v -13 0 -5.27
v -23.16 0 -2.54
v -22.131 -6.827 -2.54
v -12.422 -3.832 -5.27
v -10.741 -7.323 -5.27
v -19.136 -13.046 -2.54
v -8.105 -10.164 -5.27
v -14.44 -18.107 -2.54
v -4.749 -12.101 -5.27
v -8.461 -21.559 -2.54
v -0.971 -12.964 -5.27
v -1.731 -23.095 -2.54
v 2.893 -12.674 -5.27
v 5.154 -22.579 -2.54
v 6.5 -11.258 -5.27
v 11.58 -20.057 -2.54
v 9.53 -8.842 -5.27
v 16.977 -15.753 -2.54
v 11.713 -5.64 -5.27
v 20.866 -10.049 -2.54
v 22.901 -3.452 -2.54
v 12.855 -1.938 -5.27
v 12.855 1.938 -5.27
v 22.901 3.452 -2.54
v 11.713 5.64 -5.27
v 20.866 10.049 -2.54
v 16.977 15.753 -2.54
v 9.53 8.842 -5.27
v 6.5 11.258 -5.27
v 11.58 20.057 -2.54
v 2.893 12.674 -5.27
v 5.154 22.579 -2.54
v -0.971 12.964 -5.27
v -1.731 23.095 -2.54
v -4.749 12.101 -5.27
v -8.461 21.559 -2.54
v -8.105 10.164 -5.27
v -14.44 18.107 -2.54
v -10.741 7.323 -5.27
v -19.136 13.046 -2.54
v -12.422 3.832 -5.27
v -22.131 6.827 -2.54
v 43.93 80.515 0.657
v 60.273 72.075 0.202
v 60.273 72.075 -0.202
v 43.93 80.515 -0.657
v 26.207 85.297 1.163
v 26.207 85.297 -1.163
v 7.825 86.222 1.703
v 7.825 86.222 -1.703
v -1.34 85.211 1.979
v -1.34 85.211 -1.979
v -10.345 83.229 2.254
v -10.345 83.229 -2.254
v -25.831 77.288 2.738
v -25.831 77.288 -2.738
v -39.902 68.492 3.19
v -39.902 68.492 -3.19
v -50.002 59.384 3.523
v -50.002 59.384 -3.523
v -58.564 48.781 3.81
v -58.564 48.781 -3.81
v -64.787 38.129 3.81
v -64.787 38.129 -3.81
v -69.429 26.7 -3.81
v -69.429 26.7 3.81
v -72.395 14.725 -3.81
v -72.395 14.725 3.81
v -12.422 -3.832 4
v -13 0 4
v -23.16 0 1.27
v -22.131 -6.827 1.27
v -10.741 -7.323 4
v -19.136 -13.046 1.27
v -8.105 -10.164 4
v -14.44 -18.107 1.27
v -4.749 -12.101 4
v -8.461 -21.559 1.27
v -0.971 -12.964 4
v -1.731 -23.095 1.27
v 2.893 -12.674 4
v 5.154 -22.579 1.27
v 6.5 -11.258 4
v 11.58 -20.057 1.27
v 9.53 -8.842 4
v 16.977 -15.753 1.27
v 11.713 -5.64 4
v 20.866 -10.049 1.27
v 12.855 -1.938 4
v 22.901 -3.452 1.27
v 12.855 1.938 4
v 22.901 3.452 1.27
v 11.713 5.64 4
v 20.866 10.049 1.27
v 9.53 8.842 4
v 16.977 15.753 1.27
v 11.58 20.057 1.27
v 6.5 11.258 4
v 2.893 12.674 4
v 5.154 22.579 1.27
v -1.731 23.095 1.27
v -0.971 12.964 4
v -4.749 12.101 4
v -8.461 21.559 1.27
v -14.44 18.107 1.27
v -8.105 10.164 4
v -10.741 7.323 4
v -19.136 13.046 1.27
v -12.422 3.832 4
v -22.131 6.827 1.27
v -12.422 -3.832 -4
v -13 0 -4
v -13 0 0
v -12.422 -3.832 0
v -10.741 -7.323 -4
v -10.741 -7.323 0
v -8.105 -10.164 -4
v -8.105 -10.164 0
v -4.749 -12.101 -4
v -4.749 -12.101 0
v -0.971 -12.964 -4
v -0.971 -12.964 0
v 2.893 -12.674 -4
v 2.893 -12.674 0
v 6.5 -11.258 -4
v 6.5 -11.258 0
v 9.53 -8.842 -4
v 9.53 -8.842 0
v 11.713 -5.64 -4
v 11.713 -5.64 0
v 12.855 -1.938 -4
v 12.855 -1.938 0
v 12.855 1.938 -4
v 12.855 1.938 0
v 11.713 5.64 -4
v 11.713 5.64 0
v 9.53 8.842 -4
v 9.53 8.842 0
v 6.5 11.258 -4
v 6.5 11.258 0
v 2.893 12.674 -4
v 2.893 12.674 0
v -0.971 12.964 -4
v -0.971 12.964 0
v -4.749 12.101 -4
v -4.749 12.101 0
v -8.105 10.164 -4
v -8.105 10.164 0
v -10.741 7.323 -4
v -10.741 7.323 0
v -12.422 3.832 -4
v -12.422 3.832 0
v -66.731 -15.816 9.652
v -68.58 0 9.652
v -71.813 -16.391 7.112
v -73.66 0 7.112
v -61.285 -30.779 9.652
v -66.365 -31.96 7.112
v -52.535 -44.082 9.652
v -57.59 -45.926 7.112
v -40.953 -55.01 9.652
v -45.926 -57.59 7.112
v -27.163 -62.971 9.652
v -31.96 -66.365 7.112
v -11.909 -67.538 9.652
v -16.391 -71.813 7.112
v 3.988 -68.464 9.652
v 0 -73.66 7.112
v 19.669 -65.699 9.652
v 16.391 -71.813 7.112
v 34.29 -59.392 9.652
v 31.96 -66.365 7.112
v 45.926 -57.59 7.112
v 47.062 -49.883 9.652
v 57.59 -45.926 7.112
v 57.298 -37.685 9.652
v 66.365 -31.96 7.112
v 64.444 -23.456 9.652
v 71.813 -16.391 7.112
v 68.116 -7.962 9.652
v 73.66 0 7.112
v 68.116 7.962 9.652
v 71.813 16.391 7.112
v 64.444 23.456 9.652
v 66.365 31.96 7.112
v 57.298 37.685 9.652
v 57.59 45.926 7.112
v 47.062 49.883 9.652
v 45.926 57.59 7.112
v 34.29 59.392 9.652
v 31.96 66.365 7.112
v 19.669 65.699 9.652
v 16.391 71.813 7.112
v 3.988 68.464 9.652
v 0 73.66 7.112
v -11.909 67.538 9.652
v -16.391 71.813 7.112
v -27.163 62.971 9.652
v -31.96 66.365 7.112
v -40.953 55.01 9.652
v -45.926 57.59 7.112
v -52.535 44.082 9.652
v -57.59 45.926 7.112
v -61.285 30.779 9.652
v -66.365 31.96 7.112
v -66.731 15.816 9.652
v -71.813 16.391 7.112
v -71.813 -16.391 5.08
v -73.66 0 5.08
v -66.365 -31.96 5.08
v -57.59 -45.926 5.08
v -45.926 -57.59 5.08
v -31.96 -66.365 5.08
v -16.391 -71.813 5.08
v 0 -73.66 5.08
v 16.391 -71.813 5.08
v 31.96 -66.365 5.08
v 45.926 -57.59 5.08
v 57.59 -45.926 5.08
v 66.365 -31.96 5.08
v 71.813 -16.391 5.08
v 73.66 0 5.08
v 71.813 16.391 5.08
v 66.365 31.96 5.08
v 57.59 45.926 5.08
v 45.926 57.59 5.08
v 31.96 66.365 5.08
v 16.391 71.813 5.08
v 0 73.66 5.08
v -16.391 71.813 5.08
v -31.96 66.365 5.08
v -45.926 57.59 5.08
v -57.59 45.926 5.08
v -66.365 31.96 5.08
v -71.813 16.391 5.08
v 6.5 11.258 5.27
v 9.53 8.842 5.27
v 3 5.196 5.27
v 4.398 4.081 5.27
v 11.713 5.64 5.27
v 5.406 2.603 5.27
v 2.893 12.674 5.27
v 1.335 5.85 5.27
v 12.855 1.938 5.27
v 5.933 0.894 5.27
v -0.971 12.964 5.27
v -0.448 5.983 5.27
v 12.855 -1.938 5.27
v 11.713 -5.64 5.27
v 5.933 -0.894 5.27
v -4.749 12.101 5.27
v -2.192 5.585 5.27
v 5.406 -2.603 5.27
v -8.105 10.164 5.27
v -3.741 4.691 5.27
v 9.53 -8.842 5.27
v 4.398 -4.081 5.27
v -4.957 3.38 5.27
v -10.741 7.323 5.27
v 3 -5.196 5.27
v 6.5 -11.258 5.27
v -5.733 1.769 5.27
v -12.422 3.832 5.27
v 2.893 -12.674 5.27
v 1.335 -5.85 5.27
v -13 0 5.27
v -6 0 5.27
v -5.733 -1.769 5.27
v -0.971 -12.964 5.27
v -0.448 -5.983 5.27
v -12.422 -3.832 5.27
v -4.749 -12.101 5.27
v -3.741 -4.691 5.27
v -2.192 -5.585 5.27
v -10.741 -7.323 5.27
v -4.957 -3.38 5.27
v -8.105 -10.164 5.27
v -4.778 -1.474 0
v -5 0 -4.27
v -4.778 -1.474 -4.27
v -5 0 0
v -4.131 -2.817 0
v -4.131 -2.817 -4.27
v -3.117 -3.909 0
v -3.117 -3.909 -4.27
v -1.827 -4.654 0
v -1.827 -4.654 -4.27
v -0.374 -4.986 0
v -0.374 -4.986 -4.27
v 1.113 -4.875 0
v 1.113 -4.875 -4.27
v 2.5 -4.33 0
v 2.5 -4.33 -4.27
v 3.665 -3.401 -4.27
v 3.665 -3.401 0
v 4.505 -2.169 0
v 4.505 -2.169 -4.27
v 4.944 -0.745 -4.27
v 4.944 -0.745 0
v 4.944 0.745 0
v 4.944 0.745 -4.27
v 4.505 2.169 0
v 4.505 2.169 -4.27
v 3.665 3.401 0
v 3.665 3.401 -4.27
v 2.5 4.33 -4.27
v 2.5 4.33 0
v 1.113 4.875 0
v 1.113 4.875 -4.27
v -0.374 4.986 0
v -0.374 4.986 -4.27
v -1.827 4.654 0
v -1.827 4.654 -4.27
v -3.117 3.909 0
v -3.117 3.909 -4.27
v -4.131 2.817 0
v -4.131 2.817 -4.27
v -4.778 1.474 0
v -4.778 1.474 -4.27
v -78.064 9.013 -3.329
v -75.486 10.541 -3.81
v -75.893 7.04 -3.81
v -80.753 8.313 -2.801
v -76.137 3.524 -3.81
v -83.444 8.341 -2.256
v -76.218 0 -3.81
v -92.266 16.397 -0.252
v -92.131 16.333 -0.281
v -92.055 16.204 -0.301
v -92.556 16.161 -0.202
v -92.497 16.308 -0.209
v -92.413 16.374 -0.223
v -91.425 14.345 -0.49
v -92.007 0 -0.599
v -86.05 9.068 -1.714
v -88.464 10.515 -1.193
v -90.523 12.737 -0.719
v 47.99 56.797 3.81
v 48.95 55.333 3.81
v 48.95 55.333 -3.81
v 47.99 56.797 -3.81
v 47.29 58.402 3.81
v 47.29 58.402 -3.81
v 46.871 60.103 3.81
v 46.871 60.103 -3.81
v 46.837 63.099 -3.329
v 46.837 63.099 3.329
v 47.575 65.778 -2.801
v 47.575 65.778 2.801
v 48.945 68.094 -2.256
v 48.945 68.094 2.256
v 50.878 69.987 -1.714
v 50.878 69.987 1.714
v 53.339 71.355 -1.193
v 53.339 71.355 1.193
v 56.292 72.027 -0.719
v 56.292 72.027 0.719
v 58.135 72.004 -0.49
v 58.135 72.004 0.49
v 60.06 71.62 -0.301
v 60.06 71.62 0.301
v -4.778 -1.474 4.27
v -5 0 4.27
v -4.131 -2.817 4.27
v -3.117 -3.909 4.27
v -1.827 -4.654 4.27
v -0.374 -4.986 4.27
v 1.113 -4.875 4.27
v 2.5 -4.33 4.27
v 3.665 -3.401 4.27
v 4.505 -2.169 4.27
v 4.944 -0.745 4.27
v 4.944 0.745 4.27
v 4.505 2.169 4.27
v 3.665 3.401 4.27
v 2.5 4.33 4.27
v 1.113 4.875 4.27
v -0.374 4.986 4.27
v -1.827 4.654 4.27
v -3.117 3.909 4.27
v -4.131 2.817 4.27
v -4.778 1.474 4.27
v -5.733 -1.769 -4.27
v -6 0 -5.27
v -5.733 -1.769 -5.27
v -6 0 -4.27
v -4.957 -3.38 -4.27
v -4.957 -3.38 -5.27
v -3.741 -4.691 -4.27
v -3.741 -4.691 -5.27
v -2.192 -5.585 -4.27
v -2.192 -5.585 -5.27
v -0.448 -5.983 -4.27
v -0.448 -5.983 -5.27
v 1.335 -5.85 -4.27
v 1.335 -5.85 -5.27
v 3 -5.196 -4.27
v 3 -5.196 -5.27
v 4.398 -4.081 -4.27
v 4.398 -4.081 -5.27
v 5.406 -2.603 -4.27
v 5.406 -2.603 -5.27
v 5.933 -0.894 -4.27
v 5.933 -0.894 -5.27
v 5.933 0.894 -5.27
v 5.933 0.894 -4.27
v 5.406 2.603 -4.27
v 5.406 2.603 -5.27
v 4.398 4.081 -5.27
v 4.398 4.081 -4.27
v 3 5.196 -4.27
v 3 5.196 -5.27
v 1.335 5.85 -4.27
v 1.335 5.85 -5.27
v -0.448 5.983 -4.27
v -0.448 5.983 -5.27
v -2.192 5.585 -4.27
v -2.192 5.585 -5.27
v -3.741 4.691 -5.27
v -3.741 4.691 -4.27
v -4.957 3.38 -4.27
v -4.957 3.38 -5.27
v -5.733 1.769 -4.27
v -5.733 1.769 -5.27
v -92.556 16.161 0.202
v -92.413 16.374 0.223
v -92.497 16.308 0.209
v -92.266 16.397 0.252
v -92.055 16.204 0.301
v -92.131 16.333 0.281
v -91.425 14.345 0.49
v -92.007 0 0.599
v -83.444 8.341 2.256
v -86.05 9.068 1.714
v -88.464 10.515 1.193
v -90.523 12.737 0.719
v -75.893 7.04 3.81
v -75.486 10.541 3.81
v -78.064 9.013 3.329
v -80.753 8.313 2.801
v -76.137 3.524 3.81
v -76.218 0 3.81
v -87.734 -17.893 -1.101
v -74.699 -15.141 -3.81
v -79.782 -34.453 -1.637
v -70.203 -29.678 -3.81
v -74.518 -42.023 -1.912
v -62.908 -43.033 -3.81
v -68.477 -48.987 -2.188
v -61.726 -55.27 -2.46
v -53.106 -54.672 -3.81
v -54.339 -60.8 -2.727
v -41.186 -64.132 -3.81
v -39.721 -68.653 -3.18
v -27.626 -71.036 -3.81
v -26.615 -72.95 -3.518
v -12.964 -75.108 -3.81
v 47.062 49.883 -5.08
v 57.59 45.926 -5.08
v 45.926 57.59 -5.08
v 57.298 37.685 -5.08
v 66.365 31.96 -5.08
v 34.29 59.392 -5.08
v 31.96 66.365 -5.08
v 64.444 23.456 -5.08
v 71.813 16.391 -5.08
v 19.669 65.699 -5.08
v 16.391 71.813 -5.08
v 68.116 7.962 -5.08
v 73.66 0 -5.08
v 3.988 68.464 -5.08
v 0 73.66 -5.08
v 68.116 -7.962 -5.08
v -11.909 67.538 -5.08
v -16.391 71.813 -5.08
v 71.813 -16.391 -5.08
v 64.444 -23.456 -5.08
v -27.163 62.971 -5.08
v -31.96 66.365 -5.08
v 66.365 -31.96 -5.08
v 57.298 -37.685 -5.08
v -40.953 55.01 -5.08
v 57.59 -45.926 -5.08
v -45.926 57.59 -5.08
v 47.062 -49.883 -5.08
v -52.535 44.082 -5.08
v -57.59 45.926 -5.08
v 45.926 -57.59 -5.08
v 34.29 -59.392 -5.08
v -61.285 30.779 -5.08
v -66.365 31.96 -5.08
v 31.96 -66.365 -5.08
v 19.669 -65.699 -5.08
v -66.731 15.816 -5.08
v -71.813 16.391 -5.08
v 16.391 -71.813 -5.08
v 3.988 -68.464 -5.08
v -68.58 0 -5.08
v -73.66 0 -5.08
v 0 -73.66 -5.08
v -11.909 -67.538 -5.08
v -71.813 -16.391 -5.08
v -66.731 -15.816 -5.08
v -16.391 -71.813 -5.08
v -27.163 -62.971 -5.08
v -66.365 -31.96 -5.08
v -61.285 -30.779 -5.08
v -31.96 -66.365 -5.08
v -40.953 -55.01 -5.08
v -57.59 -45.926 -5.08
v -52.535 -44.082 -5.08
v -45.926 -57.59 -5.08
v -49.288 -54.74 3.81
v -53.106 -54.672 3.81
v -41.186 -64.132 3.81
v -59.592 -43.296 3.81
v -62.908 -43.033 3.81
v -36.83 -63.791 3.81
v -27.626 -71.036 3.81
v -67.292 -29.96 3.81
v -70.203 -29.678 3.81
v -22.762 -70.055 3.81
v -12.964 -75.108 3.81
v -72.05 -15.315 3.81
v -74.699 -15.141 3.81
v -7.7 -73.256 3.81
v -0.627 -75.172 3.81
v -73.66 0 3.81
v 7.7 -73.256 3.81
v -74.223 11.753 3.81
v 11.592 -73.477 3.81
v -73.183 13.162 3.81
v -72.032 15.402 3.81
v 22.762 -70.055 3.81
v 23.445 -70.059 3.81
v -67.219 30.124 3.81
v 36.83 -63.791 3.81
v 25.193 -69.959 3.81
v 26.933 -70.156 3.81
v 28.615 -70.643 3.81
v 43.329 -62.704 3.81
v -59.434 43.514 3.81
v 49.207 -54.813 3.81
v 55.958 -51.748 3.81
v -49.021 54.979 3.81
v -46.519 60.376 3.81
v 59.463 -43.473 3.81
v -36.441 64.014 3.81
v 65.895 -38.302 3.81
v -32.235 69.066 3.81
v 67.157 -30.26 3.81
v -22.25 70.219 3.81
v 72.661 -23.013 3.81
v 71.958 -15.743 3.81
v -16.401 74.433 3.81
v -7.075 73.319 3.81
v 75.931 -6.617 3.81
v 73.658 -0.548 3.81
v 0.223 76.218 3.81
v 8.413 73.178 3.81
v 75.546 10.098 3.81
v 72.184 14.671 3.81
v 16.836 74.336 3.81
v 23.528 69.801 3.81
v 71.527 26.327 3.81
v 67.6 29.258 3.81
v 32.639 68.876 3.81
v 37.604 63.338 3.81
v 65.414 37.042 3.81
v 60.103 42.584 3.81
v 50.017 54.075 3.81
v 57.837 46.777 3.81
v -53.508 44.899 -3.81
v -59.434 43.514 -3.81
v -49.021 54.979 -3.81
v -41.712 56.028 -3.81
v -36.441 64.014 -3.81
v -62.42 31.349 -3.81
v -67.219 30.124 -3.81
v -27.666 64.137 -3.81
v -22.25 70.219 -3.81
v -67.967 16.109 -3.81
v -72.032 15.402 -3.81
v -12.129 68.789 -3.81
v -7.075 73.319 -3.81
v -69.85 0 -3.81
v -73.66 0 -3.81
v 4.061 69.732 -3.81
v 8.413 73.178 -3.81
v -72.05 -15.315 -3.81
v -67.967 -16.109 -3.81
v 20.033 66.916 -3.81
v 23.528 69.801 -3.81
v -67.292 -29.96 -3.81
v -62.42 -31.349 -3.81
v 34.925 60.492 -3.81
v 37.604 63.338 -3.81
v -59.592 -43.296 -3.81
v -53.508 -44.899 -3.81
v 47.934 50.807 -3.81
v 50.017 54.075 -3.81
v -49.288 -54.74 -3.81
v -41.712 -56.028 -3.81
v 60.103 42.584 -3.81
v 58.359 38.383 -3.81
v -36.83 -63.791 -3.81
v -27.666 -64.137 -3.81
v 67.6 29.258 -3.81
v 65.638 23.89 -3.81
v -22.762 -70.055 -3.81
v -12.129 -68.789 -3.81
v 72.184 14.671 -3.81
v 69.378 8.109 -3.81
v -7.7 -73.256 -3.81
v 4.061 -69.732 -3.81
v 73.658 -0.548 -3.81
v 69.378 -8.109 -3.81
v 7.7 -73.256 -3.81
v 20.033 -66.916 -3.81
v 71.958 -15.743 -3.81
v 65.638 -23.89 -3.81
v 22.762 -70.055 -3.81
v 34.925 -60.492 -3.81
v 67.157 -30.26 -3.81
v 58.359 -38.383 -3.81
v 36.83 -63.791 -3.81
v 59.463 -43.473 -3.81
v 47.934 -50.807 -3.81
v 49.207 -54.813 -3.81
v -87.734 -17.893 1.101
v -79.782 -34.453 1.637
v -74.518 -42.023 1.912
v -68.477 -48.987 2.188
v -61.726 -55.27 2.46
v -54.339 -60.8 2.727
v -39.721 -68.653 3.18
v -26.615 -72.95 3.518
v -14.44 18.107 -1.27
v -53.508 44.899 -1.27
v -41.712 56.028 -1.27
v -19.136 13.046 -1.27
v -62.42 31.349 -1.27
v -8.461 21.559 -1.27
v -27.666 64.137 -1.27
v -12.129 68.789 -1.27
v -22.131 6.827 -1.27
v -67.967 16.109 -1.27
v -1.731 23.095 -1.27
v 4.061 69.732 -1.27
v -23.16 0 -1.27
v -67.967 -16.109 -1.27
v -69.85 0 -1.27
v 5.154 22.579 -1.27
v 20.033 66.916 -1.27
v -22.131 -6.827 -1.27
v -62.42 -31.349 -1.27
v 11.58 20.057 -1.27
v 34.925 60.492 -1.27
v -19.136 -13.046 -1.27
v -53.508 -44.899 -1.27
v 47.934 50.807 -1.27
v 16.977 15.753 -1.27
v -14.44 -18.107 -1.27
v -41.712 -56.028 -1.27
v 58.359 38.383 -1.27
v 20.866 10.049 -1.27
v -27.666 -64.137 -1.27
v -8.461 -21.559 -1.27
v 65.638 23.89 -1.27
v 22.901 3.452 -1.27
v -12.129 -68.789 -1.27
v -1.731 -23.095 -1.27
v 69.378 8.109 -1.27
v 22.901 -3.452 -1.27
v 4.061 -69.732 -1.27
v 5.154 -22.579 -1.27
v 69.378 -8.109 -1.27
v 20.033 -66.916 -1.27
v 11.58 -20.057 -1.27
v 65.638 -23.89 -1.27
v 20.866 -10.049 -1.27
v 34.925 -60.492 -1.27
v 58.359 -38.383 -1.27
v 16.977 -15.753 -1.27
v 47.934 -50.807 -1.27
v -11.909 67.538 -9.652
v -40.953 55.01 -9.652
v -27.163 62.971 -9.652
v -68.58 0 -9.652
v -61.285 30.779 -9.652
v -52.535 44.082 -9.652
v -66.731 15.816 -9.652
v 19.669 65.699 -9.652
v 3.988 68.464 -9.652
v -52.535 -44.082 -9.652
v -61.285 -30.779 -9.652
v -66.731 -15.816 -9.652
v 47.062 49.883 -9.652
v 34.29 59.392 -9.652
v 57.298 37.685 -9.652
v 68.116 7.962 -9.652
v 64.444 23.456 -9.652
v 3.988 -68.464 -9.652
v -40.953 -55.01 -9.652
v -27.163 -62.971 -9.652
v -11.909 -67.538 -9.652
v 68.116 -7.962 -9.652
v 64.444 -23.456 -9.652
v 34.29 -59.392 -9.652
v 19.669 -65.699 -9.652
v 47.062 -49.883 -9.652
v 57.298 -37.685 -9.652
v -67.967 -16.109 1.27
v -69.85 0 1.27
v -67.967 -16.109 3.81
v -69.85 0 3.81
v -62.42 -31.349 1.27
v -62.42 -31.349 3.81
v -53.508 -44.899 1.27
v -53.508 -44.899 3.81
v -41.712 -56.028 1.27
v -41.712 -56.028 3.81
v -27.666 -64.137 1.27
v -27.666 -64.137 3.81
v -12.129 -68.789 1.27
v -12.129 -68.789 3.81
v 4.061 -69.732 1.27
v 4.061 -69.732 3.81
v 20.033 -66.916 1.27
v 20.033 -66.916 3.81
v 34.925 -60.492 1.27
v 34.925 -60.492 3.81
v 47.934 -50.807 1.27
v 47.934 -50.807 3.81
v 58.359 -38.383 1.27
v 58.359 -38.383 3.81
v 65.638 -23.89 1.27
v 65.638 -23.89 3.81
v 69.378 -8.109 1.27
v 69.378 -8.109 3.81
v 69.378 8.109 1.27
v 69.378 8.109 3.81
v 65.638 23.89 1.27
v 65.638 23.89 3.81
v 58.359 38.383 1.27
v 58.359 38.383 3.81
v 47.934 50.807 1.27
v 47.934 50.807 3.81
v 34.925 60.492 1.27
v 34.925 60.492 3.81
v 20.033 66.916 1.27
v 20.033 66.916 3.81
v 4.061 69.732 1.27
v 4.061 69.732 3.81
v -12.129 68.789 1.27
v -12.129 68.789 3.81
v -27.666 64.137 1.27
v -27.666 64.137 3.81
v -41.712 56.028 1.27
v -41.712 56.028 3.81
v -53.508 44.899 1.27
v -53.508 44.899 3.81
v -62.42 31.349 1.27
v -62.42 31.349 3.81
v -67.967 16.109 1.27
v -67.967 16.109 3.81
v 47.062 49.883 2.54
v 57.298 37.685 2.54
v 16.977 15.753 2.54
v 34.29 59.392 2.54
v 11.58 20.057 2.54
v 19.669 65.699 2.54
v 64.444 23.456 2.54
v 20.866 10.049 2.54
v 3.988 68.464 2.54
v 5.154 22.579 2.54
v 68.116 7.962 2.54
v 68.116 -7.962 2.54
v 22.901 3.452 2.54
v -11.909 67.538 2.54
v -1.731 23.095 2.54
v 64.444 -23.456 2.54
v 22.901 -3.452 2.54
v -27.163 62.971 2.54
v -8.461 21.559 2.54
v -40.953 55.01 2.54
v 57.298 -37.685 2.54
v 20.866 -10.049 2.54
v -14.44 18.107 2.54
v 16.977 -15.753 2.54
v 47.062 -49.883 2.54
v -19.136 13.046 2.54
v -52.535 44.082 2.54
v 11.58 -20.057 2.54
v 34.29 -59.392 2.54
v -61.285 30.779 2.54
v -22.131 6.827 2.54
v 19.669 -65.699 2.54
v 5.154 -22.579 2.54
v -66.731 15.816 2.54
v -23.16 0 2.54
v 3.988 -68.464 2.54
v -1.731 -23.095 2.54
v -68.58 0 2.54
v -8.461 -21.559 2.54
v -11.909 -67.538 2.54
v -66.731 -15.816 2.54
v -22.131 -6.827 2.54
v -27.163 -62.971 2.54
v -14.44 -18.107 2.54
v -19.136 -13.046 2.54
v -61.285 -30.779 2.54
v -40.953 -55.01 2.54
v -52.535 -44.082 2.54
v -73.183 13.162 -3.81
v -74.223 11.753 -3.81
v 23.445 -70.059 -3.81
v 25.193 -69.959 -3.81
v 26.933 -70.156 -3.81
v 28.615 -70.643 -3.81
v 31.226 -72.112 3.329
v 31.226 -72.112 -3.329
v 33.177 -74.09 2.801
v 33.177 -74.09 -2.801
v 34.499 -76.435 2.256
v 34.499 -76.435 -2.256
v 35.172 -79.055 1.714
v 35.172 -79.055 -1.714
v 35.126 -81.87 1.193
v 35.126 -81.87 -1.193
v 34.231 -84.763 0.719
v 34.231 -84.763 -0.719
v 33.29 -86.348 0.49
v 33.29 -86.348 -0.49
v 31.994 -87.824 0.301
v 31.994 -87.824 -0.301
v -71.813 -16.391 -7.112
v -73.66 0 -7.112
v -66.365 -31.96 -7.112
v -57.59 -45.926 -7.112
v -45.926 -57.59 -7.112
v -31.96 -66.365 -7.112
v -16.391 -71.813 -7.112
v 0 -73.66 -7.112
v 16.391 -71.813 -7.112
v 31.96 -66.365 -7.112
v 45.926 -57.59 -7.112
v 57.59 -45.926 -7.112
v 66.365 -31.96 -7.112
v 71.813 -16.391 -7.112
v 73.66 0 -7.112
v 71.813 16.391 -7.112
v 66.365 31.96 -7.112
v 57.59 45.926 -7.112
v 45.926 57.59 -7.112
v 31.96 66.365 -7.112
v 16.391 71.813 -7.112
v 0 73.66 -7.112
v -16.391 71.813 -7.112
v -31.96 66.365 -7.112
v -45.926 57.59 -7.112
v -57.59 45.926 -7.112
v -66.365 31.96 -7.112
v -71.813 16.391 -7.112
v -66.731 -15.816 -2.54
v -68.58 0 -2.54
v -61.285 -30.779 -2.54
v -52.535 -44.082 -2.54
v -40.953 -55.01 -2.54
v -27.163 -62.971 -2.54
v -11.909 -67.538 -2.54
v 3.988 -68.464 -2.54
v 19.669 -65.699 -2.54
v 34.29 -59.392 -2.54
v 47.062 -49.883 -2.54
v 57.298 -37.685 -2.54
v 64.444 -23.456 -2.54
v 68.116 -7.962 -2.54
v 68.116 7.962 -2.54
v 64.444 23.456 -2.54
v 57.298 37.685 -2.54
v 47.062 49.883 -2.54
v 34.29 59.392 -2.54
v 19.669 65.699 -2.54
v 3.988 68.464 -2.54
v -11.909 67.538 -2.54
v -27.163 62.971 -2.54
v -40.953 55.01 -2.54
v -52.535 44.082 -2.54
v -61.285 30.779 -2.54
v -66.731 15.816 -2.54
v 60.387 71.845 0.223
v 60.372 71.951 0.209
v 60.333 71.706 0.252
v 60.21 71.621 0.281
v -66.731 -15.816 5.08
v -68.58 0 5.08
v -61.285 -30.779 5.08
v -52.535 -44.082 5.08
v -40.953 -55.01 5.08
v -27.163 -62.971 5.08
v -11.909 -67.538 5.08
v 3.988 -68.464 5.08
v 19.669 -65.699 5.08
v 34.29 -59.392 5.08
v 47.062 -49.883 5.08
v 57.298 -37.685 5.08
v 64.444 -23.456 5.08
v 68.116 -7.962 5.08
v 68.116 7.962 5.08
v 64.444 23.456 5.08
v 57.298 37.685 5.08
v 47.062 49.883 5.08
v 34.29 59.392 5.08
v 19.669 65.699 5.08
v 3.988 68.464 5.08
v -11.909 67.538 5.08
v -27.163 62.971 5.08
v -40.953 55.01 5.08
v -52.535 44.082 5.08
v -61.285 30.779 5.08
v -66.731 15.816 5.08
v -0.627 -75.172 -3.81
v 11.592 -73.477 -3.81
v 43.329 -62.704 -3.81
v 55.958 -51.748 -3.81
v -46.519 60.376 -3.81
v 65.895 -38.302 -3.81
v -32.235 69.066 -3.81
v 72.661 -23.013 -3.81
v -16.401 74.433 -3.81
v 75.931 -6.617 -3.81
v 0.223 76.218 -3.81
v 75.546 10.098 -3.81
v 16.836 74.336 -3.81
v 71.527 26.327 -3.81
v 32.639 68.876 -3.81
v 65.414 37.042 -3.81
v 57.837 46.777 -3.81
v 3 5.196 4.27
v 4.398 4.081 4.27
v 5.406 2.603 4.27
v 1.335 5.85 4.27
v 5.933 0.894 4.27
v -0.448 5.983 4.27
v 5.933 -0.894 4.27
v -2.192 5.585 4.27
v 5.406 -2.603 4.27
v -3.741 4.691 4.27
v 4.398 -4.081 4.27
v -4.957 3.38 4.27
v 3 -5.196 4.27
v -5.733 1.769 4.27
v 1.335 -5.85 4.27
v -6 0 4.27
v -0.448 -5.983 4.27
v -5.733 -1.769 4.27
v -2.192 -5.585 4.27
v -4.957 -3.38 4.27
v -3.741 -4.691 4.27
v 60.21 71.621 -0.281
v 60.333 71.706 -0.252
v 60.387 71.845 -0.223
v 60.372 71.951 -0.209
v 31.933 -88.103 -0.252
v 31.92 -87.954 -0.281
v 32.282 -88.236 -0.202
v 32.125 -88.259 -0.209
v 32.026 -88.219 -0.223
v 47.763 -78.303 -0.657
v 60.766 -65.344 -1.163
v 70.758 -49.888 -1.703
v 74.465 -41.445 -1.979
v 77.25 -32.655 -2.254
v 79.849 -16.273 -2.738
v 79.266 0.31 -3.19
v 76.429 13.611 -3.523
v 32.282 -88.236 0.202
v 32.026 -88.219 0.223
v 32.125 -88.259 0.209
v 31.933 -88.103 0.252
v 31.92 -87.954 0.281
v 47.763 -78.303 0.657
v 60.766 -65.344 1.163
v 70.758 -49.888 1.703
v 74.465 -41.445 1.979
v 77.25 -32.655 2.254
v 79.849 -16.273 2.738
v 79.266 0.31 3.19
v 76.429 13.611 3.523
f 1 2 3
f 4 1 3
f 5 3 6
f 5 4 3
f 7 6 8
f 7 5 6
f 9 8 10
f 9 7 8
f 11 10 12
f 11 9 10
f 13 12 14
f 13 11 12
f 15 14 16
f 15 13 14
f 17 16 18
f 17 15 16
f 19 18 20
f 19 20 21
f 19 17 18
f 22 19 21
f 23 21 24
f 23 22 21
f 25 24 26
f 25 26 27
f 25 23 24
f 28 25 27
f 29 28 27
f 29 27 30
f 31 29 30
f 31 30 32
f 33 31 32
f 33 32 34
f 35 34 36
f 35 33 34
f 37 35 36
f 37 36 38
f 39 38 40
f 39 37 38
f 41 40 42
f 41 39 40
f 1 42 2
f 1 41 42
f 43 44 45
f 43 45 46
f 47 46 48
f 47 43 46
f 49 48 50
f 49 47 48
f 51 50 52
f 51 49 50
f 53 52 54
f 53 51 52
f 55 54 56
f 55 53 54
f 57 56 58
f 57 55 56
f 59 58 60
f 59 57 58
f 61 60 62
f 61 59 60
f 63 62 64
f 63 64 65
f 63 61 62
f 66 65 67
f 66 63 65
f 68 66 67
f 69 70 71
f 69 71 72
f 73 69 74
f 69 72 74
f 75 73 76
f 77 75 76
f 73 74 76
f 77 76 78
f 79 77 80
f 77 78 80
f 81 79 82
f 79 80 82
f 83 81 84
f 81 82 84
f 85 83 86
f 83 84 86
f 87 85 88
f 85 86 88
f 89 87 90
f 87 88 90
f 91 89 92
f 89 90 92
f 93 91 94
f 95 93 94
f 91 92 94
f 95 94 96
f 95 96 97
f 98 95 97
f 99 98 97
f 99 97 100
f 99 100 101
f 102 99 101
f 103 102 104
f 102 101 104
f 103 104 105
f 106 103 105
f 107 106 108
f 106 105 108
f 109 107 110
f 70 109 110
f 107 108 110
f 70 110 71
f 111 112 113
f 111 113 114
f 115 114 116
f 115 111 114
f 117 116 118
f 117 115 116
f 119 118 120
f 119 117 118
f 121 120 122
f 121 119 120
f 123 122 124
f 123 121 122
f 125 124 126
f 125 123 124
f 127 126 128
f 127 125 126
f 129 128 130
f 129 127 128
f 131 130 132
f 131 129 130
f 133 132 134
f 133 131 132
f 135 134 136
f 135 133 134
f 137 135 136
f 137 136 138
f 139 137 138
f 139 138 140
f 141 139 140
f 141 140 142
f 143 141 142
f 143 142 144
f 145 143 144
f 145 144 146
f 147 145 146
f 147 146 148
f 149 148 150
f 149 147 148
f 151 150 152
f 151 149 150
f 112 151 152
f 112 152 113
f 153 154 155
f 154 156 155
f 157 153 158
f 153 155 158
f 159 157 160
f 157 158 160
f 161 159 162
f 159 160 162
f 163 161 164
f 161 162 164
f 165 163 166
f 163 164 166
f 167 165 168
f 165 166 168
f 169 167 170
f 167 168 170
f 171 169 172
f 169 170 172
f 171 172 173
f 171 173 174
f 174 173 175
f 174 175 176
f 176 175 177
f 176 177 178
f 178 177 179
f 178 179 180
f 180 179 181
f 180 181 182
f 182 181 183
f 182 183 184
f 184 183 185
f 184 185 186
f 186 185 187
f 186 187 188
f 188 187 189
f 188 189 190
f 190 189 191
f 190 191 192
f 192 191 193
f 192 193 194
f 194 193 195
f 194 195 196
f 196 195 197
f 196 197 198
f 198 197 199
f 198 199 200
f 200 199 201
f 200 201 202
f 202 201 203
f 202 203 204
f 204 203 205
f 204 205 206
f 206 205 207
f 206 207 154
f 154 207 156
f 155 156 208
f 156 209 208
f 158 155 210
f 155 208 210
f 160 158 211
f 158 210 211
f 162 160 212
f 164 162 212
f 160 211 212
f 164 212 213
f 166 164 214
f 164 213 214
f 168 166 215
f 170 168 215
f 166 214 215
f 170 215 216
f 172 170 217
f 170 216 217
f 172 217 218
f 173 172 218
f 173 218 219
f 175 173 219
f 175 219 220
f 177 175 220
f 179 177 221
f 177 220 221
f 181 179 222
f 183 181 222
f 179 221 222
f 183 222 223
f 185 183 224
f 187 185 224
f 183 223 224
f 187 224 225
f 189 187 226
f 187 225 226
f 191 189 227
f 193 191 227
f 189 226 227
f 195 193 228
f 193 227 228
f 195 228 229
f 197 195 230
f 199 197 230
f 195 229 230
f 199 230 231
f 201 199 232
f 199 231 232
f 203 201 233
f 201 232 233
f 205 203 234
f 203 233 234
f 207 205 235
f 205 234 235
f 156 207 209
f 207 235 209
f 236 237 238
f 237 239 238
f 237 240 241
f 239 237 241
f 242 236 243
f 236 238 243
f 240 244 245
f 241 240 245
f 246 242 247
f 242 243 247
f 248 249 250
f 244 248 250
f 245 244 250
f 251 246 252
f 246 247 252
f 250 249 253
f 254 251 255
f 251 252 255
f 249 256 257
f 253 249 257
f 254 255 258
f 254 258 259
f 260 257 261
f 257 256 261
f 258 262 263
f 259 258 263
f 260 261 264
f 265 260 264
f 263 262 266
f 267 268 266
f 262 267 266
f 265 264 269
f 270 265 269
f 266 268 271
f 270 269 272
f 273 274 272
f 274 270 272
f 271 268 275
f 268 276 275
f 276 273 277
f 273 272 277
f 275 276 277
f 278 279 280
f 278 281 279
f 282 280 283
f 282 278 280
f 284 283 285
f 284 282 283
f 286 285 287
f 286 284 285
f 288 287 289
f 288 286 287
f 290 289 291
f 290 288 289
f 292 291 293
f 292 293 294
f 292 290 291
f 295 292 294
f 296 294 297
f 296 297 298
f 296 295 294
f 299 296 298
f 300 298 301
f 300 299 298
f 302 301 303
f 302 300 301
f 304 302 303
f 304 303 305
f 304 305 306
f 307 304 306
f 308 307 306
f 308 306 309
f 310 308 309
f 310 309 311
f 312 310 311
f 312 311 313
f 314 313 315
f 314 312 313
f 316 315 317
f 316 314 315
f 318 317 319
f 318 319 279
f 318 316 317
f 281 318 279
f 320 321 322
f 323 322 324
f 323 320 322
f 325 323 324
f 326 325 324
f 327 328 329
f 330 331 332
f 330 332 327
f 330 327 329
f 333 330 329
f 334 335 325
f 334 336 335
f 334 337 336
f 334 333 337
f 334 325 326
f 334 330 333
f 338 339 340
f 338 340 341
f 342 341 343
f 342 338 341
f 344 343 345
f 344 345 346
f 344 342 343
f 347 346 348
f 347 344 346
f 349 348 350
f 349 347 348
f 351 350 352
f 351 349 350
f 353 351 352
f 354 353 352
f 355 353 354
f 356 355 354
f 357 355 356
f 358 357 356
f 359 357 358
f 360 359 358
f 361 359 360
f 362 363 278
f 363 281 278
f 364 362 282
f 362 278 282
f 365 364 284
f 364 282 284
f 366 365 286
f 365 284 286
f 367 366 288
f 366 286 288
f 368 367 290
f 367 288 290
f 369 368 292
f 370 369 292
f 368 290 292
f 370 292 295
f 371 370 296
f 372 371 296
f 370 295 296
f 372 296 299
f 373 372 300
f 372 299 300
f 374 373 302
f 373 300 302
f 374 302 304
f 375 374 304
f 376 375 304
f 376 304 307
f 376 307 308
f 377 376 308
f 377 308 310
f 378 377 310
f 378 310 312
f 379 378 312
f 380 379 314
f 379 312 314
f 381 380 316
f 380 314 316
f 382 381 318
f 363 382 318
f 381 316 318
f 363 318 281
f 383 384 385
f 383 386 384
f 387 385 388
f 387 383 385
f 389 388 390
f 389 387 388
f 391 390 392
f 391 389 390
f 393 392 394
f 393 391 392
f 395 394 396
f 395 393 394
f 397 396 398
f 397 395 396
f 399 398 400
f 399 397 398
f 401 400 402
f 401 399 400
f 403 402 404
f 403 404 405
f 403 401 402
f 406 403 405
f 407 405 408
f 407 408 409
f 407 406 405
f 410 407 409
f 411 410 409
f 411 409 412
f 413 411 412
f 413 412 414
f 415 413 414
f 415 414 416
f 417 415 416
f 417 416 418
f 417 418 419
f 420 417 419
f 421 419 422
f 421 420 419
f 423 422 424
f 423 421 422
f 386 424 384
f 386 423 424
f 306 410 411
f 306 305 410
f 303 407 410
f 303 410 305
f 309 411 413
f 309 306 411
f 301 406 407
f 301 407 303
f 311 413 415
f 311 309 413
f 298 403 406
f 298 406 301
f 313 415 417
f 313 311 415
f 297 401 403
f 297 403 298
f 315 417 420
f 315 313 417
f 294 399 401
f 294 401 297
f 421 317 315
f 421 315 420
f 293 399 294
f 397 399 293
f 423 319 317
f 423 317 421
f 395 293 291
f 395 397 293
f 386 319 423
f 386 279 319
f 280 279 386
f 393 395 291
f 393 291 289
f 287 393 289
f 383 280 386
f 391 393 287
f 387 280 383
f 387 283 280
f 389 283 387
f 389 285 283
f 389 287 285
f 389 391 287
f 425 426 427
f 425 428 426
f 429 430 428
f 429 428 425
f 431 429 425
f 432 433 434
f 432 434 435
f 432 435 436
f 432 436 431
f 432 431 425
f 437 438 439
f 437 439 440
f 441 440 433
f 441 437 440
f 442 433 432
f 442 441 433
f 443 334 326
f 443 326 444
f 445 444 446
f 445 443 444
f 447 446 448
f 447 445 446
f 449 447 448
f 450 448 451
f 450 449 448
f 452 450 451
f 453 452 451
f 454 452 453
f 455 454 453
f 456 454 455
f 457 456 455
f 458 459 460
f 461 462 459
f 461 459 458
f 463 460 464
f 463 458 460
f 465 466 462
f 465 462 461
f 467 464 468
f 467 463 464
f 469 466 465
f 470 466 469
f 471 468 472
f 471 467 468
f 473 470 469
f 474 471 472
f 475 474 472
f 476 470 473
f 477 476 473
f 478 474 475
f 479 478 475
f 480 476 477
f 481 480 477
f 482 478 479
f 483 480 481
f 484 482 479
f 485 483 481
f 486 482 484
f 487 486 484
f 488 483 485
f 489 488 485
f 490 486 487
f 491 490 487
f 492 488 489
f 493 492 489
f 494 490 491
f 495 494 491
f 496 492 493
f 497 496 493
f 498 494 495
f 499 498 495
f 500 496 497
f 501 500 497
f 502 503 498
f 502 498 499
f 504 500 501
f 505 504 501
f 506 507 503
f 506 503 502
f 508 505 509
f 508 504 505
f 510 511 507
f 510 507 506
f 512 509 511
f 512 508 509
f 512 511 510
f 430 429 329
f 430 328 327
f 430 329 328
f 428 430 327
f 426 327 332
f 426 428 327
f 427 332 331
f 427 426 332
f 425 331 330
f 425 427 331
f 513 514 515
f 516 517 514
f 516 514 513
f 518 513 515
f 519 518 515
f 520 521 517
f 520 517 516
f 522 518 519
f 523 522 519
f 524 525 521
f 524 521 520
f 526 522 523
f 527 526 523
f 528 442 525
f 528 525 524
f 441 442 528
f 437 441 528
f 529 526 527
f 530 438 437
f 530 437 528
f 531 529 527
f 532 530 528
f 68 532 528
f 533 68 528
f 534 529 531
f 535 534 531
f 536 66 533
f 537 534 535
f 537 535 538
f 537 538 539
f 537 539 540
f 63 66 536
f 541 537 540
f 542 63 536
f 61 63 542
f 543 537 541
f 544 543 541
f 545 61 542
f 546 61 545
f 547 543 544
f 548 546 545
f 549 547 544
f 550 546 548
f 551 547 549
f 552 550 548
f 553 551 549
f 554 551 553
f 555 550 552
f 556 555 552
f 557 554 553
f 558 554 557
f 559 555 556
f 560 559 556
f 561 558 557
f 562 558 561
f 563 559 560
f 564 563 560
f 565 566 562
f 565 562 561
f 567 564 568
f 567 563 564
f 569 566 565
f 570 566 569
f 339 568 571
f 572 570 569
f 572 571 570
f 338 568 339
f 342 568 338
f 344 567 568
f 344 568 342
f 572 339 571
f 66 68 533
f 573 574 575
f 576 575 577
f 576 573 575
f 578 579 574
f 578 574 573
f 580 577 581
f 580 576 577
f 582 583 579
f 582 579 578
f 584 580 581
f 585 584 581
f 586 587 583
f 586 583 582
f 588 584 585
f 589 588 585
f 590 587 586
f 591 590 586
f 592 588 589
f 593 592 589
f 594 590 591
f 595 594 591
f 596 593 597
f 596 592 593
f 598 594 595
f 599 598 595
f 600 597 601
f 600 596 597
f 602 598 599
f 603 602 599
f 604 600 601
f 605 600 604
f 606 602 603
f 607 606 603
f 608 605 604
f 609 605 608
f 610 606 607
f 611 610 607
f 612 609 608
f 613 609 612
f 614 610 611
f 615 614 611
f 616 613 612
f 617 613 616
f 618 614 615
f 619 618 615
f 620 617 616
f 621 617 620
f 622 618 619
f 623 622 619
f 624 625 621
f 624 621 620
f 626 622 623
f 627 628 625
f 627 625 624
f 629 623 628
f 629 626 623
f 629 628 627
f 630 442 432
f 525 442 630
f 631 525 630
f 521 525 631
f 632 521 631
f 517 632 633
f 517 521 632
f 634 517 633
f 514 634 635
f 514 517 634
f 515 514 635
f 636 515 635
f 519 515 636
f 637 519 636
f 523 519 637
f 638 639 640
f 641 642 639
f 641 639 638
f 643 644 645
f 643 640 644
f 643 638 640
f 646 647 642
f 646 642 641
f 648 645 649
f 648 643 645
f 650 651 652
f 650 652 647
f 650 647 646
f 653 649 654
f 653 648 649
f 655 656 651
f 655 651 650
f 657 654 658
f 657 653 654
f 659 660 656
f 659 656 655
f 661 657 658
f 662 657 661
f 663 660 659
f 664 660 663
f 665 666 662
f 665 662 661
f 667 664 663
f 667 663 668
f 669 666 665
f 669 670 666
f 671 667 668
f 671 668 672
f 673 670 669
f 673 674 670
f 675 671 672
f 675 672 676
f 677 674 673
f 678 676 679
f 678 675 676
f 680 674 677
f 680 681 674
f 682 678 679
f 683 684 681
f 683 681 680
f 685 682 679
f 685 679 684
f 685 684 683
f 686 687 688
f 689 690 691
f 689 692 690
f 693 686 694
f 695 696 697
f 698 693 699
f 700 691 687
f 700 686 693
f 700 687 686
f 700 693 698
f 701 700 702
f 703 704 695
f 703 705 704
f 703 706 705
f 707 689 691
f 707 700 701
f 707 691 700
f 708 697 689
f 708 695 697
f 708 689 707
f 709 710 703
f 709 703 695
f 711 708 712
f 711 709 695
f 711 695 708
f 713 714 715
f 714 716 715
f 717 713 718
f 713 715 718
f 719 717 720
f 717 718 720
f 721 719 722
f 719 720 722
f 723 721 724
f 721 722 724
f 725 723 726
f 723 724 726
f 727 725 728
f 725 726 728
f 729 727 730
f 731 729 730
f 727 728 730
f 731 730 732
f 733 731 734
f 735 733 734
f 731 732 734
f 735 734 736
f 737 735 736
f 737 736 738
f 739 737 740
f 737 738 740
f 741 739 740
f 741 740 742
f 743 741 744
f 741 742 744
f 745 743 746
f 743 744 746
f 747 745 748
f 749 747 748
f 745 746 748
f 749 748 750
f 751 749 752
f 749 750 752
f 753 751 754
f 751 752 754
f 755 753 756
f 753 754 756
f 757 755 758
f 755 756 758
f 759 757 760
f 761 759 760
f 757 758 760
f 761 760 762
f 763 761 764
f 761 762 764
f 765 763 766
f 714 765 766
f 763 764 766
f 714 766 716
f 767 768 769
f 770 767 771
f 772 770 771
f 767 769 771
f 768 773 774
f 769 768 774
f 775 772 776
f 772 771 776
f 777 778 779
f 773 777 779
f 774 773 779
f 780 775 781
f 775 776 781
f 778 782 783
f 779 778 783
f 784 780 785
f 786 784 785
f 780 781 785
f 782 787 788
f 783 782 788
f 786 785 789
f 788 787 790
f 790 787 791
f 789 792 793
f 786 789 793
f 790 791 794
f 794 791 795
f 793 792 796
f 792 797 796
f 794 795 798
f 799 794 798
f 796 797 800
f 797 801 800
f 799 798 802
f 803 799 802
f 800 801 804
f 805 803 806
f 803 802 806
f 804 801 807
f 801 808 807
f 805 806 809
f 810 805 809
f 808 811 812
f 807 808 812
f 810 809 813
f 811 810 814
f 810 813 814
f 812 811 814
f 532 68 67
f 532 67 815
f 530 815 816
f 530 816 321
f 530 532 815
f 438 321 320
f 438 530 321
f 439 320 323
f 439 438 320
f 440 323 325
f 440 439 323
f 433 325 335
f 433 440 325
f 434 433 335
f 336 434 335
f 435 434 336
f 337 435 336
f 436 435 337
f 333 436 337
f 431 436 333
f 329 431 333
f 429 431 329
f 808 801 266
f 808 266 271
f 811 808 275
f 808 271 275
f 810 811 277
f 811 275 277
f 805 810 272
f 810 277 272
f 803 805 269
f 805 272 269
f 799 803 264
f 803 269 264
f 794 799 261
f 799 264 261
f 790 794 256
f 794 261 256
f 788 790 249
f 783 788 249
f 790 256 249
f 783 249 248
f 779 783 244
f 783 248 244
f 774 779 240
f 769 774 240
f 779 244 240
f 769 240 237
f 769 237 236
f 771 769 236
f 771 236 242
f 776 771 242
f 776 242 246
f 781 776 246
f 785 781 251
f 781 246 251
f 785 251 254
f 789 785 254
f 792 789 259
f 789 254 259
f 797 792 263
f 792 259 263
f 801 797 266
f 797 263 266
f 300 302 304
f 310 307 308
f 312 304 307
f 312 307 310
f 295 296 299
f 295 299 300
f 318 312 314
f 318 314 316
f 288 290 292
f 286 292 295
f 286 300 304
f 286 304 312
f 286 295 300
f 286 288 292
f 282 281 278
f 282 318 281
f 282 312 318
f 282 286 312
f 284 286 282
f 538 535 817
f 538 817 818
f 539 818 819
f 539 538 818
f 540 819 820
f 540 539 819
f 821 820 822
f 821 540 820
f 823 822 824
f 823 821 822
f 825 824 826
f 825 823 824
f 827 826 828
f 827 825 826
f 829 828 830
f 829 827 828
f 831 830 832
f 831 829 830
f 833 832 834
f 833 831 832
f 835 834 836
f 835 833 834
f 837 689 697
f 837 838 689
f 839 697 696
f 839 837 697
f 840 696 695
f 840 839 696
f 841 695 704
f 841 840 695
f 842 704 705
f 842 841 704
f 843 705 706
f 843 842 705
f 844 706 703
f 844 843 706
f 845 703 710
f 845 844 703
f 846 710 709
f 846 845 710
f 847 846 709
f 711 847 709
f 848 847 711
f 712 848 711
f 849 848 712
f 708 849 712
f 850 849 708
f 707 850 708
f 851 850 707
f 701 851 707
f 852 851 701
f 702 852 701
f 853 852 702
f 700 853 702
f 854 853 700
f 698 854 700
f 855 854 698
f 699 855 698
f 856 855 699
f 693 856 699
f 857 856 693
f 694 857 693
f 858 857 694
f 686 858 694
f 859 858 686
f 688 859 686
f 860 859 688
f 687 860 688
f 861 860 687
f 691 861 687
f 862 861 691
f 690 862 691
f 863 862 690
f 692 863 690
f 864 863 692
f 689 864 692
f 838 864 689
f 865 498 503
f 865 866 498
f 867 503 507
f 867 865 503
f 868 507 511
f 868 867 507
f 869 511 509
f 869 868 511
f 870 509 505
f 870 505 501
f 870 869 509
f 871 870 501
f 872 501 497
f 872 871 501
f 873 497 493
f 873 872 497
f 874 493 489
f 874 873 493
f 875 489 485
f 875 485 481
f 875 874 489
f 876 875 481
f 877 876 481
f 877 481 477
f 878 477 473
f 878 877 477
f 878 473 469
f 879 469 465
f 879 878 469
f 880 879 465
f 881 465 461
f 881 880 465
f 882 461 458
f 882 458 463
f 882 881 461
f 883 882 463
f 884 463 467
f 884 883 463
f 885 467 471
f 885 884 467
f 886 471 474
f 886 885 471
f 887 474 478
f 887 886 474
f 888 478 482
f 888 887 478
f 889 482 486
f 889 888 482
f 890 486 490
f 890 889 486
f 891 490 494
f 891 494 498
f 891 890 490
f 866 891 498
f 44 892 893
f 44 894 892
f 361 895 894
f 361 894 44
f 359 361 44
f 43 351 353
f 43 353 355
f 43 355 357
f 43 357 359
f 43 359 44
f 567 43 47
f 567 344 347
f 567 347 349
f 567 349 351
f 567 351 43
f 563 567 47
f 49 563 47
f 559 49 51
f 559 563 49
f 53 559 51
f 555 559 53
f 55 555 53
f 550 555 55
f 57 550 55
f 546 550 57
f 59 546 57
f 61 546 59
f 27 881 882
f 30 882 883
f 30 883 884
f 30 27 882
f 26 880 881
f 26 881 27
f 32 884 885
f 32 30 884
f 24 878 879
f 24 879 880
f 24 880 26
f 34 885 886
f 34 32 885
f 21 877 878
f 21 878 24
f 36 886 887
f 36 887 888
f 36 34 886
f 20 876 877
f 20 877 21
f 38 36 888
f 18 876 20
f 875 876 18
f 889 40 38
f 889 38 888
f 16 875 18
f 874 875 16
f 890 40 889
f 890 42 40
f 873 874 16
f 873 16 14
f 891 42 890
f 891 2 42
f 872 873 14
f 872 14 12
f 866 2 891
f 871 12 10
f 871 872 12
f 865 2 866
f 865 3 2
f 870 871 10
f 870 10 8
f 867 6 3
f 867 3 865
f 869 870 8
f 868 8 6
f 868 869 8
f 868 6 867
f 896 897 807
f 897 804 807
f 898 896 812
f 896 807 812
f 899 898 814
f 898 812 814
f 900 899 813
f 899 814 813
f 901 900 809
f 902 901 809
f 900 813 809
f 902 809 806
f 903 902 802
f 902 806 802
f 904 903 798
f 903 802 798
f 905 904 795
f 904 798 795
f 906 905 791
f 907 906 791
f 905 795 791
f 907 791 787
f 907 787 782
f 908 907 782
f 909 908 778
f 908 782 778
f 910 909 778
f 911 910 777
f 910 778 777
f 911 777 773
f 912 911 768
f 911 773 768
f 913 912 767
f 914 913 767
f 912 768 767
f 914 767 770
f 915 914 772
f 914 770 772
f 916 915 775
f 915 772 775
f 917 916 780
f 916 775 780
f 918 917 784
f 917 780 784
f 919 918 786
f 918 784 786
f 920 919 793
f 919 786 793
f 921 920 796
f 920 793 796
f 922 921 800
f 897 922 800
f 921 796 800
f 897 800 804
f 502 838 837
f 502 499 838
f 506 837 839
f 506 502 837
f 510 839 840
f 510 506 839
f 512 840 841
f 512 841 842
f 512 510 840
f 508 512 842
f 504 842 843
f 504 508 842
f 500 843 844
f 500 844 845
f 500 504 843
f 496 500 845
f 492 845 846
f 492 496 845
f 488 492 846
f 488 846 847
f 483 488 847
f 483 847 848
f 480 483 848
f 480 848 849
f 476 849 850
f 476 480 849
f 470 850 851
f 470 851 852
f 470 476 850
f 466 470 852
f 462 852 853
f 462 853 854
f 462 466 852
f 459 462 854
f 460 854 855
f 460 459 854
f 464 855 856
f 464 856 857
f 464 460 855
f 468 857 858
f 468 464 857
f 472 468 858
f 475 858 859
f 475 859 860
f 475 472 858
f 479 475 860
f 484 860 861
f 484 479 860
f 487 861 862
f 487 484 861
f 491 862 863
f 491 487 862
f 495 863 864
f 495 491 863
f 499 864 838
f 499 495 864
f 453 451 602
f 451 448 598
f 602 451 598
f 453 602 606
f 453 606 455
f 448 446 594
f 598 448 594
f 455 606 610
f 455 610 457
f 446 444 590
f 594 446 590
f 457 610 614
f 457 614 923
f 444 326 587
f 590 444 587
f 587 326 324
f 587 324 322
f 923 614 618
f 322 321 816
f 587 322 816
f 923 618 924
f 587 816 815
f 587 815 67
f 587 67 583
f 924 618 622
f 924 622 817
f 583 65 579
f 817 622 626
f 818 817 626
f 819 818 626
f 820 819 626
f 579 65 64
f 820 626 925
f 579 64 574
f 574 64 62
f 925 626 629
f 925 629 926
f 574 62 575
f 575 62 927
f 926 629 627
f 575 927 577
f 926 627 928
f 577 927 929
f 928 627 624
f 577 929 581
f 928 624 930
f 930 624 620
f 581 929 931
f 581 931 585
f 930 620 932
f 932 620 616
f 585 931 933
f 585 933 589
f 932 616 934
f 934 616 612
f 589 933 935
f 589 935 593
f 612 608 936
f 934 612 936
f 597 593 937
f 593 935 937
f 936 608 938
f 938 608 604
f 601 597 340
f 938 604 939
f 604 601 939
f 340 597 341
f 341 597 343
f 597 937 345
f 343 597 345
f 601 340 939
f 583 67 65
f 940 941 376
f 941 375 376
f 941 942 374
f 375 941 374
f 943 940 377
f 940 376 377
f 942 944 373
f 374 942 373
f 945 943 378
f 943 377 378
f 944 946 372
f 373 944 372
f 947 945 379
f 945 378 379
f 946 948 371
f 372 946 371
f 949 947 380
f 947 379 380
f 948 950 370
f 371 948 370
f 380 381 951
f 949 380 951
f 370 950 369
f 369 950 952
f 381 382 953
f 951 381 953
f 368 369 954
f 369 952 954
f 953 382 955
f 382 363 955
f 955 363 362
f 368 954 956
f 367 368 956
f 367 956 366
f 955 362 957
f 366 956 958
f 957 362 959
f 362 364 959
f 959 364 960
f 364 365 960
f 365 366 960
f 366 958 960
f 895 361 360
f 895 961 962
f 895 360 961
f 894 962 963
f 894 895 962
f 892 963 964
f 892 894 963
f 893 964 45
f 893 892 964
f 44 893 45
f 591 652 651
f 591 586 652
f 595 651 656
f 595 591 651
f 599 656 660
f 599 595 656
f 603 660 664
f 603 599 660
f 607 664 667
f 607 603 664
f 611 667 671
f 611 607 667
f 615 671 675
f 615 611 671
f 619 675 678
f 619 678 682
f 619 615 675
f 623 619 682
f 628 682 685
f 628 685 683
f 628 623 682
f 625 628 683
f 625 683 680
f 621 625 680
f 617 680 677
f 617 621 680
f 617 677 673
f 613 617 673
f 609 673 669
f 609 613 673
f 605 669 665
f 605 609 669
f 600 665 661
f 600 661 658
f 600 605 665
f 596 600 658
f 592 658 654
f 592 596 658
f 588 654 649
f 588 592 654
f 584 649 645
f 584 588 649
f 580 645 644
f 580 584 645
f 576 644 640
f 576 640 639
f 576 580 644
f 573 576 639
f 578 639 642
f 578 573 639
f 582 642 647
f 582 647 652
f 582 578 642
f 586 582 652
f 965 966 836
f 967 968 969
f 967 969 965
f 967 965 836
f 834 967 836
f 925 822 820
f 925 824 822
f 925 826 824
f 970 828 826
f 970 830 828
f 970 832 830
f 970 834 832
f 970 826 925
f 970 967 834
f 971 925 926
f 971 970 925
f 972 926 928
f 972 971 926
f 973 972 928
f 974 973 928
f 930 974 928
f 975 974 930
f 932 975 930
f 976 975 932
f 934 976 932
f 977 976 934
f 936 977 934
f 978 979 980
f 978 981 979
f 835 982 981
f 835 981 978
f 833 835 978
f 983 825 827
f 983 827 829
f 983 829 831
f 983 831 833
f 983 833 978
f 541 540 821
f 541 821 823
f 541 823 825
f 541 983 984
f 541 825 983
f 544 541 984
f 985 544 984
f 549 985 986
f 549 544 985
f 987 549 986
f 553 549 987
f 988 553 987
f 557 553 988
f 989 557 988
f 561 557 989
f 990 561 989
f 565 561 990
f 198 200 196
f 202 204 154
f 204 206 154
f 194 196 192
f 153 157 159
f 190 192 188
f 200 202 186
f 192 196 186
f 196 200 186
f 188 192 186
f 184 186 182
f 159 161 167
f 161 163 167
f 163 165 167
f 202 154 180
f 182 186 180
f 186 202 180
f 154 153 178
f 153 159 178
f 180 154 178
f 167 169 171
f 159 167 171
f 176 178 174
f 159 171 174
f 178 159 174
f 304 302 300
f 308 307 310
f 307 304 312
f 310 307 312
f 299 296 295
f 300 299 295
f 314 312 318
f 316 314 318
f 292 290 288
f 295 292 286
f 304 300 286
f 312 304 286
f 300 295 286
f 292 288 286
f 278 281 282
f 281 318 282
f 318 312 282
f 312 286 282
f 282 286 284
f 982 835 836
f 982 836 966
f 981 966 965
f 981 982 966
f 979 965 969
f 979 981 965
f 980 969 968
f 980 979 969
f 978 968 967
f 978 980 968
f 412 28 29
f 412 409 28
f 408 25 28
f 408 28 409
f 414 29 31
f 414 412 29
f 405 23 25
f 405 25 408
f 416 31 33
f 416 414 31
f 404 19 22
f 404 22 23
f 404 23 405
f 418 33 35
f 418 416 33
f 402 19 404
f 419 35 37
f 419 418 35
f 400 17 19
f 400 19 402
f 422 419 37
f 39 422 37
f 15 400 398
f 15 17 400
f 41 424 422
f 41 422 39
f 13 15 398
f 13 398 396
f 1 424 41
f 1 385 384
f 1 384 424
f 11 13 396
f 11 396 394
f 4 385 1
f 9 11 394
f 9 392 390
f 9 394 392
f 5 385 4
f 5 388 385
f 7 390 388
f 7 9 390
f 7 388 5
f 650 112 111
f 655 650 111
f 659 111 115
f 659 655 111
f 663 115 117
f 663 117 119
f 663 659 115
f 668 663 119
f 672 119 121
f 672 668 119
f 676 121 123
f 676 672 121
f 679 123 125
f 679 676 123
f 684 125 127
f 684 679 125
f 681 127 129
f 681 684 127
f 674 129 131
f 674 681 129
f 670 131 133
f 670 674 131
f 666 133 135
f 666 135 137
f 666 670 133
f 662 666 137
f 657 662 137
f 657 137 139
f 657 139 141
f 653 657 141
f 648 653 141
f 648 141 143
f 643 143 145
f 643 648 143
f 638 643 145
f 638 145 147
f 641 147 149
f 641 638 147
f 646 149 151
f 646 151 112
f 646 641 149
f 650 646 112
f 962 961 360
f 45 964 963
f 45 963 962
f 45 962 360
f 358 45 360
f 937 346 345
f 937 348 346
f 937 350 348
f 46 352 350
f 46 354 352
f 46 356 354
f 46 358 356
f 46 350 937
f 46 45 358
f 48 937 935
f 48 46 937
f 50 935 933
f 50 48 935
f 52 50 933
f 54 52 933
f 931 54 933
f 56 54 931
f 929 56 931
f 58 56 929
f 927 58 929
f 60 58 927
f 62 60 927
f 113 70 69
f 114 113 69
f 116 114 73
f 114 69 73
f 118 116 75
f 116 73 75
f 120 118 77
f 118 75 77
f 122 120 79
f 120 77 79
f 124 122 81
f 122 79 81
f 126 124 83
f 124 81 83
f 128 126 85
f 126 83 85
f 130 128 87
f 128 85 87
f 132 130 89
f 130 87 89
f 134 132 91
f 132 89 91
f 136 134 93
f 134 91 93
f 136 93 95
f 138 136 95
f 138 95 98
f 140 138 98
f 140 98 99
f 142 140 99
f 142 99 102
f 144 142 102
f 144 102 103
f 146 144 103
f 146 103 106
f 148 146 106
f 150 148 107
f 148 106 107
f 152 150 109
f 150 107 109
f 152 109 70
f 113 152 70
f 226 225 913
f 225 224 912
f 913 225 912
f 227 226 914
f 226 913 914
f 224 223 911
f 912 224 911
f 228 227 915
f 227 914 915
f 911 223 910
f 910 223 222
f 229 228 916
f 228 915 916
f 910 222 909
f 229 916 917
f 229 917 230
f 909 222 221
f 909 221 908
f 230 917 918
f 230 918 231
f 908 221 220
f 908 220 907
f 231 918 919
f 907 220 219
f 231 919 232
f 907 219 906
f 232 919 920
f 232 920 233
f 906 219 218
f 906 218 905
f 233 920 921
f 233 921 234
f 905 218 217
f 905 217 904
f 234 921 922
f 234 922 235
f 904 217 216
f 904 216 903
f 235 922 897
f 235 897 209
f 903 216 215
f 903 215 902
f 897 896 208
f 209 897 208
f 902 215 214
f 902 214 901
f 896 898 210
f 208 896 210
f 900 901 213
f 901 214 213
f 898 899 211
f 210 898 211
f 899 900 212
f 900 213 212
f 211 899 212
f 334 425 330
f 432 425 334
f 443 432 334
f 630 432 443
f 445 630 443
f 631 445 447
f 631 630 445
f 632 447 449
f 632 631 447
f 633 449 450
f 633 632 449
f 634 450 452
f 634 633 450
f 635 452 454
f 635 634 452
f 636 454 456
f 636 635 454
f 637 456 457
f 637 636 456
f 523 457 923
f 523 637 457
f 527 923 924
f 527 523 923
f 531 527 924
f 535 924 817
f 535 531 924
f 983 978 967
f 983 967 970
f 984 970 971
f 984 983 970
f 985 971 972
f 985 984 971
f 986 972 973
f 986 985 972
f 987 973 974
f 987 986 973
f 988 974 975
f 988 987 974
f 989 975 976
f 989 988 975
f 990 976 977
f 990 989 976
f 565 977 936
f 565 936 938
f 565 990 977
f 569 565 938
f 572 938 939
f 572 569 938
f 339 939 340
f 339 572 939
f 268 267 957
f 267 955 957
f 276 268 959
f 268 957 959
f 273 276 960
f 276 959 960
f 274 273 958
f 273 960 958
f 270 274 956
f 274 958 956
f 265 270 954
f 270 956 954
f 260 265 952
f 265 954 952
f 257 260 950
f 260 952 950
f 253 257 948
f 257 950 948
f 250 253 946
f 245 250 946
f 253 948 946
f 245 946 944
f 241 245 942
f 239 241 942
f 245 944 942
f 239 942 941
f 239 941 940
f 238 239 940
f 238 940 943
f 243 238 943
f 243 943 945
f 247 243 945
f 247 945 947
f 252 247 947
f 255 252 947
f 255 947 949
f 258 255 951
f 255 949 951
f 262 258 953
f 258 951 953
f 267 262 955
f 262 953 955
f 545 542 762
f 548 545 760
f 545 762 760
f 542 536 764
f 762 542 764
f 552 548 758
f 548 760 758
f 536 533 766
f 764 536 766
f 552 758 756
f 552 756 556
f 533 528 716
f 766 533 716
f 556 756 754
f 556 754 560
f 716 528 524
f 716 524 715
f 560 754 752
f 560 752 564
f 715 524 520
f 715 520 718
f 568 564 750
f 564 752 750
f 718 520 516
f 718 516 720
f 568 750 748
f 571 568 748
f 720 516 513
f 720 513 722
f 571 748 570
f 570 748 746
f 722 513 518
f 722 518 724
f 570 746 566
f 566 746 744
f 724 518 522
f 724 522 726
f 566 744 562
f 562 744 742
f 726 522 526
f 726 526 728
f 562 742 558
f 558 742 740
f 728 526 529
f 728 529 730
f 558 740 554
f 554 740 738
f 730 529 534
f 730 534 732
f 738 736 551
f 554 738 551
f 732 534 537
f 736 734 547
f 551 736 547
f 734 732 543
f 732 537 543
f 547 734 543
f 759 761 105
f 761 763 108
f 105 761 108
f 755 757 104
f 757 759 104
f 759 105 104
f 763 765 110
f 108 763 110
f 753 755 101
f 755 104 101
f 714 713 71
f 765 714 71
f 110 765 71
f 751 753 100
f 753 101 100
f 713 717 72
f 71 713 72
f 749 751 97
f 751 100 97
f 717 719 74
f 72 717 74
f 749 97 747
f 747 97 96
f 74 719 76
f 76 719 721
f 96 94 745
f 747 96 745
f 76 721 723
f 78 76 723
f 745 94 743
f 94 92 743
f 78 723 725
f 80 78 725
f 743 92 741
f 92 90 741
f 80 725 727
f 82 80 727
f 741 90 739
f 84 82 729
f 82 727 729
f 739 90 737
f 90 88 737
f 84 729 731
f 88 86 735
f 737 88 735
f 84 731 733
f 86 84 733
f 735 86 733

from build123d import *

# Parameters (mm, degrees)
F4_DEPTH = 3.81
F5_COUNT = 3
F6_R     = 0.254
F6_2_R   = 0.254
F6_3_R   = 0.254


with BuildPart() as f1:
    # F0 (on Front) → F1 (revolve)
    with BuildSketch(Plane.XZ):
        Polygon((-73.66, 0), (-13, 0), (-13, 4), (-23.16, 1.27), (-69.85, 1.27), (-69.85, 3.81), (-73.66, 3.81), (-73.66, 1.27), align=None)
    revolve(axis=Axis((0, 0, 0.2920920961), (0, 0, 1)))

    # F2: F1 across face


with BuildPart() as f1_1:
    add(f1.part)
    add(f1.part.mirror(Plane(origin=(0, 0, 0), x_dir=(1, 0, 0), z_dir=(0, 0, -1))))


with BuildPart() as f4:
    # F3 (on Top) → F4 (new body, symmetric)
    with BuildSketch(Plane.XY):
        with BuildLine():
            ThreePointArc((50.0636124905, 54.1259794918), (49.0768492837, 68.2585823105), (63.1221299568, 70.1117565792))
            ThreePointArc((63.1221299568, 70.1117565792), (-26.6928575819, 76.8521461739), (-73.66, 0))
            ThreePointArc((-73.66, 0), (-29.5090524227, 67.4908247476), (50.0166610132, 54.0752181789))
            Line((50.0166610132, 54.0752181789), (50.0636124905, 54.1259794918))
        make_face()
    extrude(amount=F4_DEPTH, both=True)


with BuildPart() as f5_1:
    # F5: instance of F4
    add(f4.part.rotate(Axis((0, 0, 0.2920920961), (0, 0, 1)), 1 * 360 / F5_COUNT))

    # F6#3
    f6_3_edges = [f5_1.edges().sort_by_distance(p)[0] for p in [
        (-92.279627, 19.60949, 0),
    ]]
    fillet(f6_3_edges, radius=F6_3_R)


with BuildPart() as f5_2:
    # F5: instance of F4
    add(f4.part.rotate(Axis((0, 0, 0.2920920961), (0, 0, 1)), 2 * 360 / F5_COUNT))

    # F6
    f6_edges = [f5_2.edges().sort_by_distance(p)[0] for p in [
        (29.157497, -89.721246, 0),
    ]]
    fillet(f6_edges, radius=F6_R)


with BuildPart() as f4_1:
    add(f4.part)

    # F6#2
    f6_2_edges = [f4_1.edges().sort_by_distance(p)[0] for p in [
        (63.12213, 70.111757, 0),
    ]]
    fillet(f6_2_edges, radius=F6_2_R)

    # F7: union F5_1, F5_2, F1
    add(f5_1.part)
    add(f5_2.part)
    add(f1_1.part)

    # F8 (on Front) → F9 (revolve, cut)
    with BuildSketch(Plane.XZ):
        Polygon((-94.951055944, 0), (-76.2184038758, 3.81), (-94.951055944, 3.81), align=None)
        Polygon((-76.2184038758, -3.81), (-94.951055944, 0), (-94.951055944, -3.81), align=None)
    revolve(axis=Axis((0, 0, 0.2920920961), (0, 0, 1)), mode=Mode.SUBTRACT)


with BuildPart() as f11:
    # F10 (on Front) → F11 (revolve)
    with BuildSketch(Plane.XZ):
        Polygon((-73.66, 7.112), (-73.66, 5.08), (-68.58, 5.08), (-68.58, 2.54), (-23.16, 2.54), (-13, 5.27), (-6, 5.27), (-6, 4.27), (-5, 4.27), (-5, 0), (0, 0), (0, 9.652), (-68.58, 9.652), align=None)
    revolve(axis=Axis((0, 0, 0.2920920961), (0, 0, 1)))


with BuildPart() as f12_1:
    # F12: instance of F11
    add(f11.part.mirror(Plane(origin=(0, 0, 0), x_dir=(1, 0, 0), z_dir=(0, 0, -1))))


solid = Compound([f4_1.part, f11.part, f12_1.part])
